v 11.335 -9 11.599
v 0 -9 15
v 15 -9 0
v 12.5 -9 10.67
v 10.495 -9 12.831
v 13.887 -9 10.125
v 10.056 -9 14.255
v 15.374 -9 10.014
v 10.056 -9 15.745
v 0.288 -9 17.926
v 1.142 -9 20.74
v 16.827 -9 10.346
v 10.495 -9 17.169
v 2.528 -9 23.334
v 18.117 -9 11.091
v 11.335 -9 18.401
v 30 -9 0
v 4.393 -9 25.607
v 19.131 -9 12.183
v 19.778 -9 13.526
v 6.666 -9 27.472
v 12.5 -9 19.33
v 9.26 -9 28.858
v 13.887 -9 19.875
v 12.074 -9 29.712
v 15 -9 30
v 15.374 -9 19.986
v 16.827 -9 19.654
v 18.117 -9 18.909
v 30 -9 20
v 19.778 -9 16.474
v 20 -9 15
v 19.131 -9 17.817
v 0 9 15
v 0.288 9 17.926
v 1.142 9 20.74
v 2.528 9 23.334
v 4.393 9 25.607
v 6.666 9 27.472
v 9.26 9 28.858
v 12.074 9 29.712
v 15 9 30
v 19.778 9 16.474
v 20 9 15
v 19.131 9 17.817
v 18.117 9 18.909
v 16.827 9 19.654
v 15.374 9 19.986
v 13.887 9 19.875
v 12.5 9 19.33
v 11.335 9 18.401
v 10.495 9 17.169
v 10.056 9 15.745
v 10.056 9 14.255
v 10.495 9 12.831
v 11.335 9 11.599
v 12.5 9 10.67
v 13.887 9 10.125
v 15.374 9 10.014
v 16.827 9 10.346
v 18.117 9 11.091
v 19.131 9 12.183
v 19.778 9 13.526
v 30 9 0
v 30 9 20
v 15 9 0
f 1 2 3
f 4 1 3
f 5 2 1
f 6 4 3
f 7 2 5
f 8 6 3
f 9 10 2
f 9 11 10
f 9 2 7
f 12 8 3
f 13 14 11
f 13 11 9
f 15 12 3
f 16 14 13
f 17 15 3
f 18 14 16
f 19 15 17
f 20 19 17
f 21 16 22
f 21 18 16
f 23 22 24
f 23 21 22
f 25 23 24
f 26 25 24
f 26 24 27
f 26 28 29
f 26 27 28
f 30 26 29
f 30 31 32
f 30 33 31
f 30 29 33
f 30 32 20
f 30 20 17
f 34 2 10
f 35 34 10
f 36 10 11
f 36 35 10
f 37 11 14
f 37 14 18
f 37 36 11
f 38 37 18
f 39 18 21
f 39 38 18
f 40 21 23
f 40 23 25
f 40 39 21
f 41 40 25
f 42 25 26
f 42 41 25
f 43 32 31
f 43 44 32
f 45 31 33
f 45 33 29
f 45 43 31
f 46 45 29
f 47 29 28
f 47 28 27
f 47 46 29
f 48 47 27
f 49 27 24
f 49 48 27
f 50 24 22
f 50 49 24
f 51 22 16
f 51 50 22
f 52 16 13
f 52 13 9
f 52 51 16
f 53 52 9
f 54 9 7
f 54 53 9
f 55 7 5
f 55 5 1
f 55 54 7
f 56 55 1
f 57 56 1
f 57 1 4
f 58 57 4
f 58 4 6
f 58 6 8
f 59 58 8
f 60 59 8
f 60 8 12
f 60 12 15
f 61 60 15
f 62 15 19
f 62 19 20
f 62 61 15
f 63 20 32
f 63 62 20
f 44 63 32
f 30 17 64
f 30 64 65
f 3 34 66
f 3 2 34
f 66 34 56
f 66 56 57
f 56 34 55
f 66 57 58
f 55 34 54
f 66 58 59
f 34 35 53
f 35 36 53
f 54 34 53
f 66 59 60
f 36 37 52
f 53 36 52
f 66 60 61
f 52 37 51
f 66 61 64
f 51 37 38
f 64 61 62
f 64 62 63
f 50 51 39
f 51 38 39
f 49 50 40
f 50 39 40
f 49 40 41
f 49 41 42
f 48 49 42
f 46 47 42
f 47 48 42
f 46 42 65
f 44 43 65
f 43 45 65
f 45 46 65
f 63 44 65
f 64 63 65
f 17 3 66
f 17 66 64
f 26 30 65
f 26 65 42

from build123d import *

# Parameters (mm, degrees)
F0_R     = 5
F1_DEPTH = 9
F2_R     = 14.99999


# Not quite as in the source:
# - a fillet or chamfer is up to 0.001 mm smaller than in the source, because OpenCascade refuses the exact size


with BuildPart() as f1:
    # F0 (on Front) → F1 (new body, symmetric)
    with BuildSketch(Plane.XZ):
        Polygon((0, 15), (15, 0), (30, 0), (30, 20), (15, 30), (0, 30), align=None)
        with Locations((15, 15)):
            Circle(F0_R, mode=Mode.SUBTRACT)
    extrude(amount=F1_DEPTH, both=True)

    # F2 (radius 15 in the source; OpenCascade refuses exactly that, so slightly less here)
    f2_edges = [f1.edges().sort_by_distance(p)[0] for p in [
        (0, 0, 30),
    ]]
    fillet(f2_edges, radius=F2_R)


solid = f1.part
